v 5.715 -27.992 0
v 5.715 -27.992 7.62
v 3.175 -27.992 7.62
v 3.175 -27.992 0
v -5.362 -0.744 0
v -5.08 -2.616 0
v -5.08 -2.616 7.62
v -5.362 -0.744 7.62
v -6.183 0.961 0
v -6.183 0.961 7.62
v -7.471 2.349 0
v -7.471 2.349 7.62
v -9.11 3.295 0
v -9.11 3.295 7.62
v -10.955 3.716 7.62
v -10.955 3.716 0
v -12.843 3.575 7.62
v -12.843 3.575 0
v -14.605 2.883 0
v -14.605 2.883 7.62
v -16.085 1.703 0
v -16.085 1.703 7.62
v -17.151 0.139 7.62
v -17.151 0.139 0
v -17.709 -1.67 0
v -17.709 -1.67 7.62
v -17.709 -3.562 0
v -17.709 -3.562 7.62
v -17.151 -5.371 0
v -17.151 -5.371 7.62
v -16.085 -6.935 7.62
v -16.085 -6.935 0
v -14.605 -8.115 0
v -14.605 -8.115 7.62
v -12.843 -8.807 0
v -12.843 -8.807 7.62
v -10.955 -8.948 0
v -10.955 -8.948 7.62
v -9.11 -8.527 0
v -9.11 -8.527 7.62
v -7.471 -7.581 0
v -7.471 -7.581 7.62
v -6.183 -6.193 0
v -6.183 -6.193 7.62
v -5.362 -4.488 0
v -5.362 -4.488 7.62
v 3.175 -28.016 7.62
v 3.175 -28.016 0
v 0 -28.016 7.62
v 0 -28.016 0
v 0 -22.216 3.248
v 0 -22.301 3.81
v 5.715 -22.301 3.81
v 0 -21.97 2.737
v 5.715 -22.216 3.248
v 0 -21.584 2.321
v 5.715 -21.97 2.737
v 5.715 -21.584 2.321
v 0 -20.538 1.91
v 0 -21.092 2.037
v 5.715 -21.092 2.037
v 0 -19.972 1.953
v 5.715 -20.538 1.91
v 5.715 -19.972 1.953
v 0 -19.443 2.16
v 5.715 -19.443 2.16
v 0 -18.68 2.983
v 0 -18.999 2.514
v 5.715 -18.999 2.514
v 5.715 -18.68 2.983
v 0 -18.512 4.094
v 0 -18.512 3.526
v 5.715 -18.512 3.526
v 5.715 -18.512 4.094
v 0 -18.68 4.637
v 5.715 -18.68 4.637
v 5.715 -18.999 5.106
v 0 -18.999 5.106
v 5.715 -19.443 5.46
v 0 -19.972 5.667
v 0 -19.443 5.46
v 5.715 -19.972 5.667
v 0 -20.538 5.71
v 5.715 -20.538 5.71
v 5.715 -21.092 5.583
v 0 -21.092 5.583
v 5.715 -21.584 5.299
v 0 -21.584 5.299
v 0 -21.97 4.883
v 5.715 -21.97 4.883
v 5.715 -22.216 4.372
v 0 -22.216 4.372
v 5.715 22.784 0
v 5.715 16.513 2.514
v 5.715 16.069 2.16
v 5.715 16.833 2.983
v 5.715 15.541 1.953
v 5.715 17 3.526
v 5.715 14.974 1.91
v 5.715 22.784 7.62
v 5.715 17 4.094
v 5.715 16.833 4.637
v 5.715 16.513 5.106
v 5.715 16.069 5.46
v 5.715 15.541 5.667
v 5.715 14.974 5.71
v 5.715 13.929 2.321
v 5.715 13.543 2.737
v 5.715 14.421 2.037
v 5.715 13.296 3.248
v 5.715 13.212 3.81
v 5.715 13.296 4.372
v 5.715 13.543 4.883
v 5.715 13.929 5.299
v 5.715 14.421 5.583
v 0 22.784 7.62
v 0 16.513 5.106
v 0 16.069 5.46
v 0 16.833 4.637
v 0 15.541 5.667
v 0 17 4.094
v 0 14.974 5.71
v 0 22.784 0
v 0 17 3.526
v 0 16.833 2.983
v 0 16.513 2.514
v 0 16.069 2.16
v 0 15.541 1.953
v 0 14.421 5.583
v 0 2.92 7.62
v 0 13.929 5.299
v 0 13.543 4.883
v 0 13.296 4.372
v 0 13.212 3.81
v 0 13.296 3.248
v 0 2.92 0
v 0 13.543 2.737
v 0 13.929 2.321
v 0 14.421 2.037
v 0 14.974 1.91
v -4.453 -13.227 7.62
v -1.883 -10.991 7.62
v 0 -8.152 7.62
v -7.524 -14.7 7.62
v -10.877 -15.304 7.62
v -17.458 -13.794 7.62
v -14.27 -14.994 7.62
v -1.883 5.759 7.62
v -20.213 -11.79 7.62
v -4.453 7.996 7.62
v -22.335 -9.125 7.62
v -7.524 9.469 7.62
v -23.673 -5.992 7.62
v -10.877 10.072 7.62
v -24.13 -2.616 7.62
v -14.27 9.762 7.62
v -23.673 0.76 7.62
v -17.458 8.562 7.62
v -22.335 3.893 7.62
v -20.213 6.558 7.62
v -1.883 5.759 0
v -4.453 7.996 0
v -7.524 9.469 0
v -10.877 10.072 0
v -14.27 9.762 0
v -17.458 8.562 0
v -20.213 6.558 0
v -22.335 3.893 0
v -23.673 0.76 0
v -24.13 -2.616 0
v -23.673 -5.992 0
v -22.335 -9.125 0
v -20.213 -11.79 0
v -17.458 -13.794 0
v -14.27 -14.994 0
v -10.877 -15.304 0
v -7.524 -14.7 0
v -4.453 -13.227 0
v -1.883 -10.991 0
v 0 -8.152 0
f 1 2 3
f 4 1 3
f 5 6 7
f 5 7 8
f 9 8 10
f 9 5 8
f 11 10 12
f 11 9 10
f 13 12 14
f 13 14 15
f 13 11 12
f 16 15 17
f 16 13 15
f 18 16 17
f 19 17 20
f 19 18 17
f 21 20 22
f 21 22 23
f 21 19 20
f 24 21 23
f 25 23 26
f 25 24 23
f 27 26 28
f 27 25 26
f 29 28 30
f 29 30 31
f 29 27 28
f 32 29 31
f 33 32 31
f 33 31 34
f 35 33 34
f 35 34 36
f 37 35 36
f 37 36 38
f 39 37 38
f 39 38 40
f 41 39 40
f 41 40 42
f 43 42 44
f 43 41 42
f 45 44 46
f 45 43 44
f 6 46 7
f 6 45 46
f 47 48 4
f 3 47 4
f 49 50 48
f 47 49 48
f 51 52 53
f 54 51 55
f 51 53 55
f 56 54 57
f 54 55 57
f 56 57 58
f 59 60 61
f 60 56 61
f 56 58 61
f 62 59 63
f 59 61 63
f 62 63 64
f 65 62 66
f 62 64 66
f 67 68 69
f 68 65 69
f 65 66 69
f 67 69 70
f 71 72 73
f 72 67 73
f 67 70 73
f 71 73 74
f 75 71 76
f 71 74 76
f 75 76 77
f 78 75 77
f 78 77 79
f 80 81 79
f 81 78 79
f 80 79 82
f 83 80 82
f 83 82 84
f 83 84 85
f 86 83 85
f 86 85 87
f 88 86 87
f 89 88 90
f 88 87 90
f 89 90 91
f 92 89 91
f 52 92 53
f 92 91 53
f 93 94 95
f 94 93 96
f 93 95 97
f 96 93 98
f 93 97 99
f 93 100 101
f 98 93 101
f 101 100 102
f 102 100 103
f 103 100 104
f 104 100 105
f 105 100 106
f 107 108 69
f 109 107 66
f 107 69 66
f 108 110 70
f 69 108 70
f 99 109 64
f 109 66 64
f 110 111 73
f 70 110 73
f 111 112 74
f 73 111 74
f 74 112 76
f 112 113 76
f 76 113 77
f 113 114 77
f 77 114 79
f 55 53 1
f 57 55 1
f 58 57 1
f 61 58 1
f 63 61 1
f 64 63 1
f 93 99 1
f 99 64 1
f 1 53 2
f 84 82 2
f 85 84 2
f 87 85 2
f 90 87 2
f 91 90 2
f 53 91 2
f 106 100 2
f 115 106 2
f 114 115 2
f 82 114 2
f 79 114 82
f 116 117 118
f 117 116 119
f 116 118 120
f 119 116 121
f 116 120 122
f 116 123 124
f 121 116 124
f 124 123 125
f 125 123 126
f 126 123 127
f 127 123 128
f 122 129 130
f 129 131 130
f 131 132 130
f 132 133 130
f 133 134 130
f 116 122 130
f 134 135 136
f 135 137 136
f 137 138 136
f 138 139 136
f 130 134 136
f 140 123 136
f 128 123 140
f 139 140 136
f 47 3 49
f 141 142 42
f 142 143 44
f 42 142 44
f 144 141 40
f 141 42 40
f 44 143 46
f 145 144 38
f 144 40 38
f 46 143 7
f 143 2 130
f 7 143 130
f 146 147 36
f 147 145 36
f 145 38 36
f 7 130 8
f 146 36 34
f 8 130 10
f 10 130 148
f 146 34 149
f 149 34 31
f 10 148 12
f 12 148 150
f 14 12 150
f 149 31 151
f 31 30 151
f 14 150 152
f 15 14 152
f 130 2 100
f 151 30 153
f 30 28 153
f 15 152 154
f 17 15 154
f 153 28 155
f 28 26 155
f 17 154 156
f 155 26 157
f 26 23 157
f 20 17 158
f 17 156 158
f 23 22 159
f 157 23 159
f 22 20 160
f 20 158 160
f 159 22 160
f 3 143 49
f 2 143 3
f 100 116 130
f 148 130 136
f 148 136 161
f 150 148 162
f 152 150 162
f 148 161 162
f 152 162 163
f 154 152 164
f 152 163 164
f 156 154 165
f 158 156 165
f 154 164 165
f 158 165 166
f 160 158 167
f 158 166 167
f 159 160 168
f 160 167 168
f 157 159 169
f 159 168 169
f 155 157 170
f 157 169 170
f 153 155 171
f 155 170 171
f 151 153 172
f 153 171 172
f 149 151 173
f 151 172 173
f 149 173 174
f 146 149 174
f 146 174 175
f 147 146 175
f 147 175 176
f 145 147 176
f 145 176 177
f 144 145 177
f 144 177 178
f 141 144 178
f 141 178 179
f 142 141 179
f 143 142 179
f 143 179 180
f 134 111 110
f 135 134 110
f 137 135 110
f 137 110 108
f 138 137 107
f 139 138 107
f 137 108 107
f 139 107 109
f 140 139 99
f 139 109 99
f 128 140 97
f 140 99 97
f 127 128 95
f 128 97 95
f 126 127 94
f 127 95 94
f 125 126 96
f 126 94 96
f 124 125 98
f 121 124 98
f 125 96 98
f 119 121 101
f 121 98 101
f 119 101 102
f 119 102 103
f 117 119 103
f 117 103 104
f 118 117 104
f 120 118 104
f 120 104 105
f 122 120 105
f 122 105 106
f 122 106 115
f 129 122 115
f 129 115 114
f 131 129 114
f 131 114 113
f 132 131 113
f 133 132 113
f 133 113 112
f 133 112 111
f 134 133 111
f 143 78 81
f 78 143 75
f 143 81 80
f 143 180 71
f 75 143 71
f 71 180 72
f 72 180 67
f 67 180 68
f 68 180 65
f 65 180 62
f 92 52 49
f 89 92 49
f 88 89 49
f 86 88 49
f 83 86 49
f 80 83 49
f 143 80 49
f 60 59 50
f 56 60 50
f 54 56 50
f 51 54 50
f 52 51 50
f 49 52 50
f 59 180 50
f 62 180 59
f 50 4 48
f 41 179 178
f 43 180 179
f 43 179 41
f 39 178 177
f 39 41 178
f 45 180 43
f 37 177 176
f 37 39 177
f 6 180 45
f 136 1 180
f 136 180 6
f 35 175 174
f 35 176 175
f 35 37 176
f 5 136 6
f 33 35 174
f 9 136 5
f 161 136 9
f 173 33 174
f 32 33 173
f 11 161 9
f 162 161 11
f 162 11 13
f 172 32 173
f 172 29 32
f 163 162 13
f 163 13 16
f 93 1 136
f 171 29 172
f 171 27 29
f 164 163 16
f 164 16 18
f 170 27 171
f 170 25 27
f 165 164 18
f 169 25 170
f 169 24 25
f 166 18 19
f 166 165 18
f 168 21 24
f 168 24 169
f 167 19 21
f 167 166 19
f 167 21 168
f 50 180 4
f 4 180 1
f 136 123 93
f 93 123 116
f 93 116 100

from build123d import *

# Parameters (mm, degrees)
SKETCH1_R               = 12.7
SKETCH1_R_2             = 6.35
BOSS_EXTRUDE1_DEPTH     = 7.62
CUT_EXTRUDE1_DEPTH      = 7.619999999999999
CUT_EXTRUDE1_DEPTH_BACK = 10.16
BOSS_EXTRUDE2_DEPTH     = 7.619999999999999
SKETCH5_R               = 1.905
SKETCH5_R_2             = 1.9050000000000018
CUT_EXTRUDE2_DEPTH      = 7.619999999999999


with BuildPart() as part:
    # Sketch1 → Boss-Extrude1 (new body)
    # profile 1 of 2: a face of its own
    with BuildSketch(Plane.XY):
        with Locations((-11.43, -2.615954225782393)):
            Circle(SKETCH1_R)
        with Locations((-11.43, -2.615954225782393)):
            Circle(SKETCH1_R_2, mode=Mode.SUBTRACT)
    # profile 2 of 2: a face of its own
    with BuildSketch(Plane.XY):
        Polygon((-8.7e-16, 22.784045774217606), (0, -28.01595422578239), (3.175, -28.01595422578239), (3.174999999999999, 22.784045774217606), align=None)
    extrude(amount=BOSS_EXTRUDE1_DEPTH)

    # Sketch3 → Cut-Extrude1 (cut, two sides: drawn at the far end of the back side and taken through both)
    with BuildSketch(Plane(origin=(5.715, 1e-16, 0), x_dir=(0, 0, -1), z_dir=(1, 2e-17, 0)).offset(-CUT_EXTRUDE1_DEPTH_BACK)):
        with BuildLine():
            ThreePointArc((-1.905, 15.116671425817602), (-2.4629615818396333, 16.46370984397798), (-3.810000000000017, 17.0216714258176))
            Line((-3.81, 17.0216714258176), (-3.81, 15.116671425817602))
            Line((-3.81, 15.116671425817602), (-3.81, 13.211671425817602))
            ThreePointArc((-3.8100000000000174, 13.211671425817602), (-2.4629615818396333, 13.769633007657223), (-1.905, 15.116671425817602))
        make_face()
        with BuildLine():
            Line((-3.81, 15.116671425817602), (-3.81, 17.0216714258176))
            ThreePointArc((-3.810000000000017, 17.0216714258176), (-5.715, 15.116671425817602), (-3.8100000000000174, 13.211671425817602))
            Line((-3.81, 13.211671425817602), (-3.81, 15.116671425817602))
        make_face()
        with BuildLine():
            ThreePointArc((-1.9049999999999947, -20.395954225782393), (-2.4629615818396298, -19.048915807622013), (-3.810000000000017, -18.490954225782392))
            Line((-3.81, -18.490954225782392), (-3.81, -20.395954225782393))
            Line((-3.81, -20.395954225782393), (-3.81, -22.300954225782395))
            ThreePointArc((-3.8100000000000156, -22.300954225782395), (-2.462961581839629, -21.742992643942774), (-1.9049999999999947, -20.395954225782393))
        make_face()
        with BuildLine():
            Line((-3.81, -20.395954225782393), (-3.81, -18.490954225782392))
            ThreePointArc((-3.810000000000017, -18.490954225782392), (-5.7149999999999945, -20.395954225782393), (-3.8100000000000156, -22.300954225782395))
            Line((-3.81, -22.300954225782395), (-3.81, -20.395954225782393))
        make_face()
    extrude(amount=CUT_EXTRUDE1_DEPTH + CUT_EXTRUDE1_DEPTH_BACK, mode=Mode.SUBTRACT)

    # Sketch4 → Boss-Extrude2 (add)
    with BuildSketch(Plane.XY.offset(7.62)):
        Polygon((3.174999999999999, 22.784045774217606), (5.715, 22.784045774217606), (5.715000000000006, -27.992122779019148), (3.174999999999999, -27.992122779019148), align=None)
    extrude(amount=-BOSS_EXTRUDE2_DEPTH)

    # Sketch5 → Cut-Extrude2 (cut)
    with BuildSketch(Plane(origin=(5.7150000000000025, 6.8e-16, 0), x_dir=(0, 0, -1), z_dir=(1, 1.2e-16, 0))):
        with Locations(Location((-3.81, 15.116671425817602, 0), (0, 0, 270))):
            Circle(SKETCH5_R)
        with Locations(Location((-3.8099999999999947, -20.395954225782393, 0), (0, 0, 270))):
            Circle(SKETCH5_R_2)
    extrude(amount=-CUT_EXTRUDE2_DEPTH, mode=Mode.SUBTRACT)


solid = part.part
